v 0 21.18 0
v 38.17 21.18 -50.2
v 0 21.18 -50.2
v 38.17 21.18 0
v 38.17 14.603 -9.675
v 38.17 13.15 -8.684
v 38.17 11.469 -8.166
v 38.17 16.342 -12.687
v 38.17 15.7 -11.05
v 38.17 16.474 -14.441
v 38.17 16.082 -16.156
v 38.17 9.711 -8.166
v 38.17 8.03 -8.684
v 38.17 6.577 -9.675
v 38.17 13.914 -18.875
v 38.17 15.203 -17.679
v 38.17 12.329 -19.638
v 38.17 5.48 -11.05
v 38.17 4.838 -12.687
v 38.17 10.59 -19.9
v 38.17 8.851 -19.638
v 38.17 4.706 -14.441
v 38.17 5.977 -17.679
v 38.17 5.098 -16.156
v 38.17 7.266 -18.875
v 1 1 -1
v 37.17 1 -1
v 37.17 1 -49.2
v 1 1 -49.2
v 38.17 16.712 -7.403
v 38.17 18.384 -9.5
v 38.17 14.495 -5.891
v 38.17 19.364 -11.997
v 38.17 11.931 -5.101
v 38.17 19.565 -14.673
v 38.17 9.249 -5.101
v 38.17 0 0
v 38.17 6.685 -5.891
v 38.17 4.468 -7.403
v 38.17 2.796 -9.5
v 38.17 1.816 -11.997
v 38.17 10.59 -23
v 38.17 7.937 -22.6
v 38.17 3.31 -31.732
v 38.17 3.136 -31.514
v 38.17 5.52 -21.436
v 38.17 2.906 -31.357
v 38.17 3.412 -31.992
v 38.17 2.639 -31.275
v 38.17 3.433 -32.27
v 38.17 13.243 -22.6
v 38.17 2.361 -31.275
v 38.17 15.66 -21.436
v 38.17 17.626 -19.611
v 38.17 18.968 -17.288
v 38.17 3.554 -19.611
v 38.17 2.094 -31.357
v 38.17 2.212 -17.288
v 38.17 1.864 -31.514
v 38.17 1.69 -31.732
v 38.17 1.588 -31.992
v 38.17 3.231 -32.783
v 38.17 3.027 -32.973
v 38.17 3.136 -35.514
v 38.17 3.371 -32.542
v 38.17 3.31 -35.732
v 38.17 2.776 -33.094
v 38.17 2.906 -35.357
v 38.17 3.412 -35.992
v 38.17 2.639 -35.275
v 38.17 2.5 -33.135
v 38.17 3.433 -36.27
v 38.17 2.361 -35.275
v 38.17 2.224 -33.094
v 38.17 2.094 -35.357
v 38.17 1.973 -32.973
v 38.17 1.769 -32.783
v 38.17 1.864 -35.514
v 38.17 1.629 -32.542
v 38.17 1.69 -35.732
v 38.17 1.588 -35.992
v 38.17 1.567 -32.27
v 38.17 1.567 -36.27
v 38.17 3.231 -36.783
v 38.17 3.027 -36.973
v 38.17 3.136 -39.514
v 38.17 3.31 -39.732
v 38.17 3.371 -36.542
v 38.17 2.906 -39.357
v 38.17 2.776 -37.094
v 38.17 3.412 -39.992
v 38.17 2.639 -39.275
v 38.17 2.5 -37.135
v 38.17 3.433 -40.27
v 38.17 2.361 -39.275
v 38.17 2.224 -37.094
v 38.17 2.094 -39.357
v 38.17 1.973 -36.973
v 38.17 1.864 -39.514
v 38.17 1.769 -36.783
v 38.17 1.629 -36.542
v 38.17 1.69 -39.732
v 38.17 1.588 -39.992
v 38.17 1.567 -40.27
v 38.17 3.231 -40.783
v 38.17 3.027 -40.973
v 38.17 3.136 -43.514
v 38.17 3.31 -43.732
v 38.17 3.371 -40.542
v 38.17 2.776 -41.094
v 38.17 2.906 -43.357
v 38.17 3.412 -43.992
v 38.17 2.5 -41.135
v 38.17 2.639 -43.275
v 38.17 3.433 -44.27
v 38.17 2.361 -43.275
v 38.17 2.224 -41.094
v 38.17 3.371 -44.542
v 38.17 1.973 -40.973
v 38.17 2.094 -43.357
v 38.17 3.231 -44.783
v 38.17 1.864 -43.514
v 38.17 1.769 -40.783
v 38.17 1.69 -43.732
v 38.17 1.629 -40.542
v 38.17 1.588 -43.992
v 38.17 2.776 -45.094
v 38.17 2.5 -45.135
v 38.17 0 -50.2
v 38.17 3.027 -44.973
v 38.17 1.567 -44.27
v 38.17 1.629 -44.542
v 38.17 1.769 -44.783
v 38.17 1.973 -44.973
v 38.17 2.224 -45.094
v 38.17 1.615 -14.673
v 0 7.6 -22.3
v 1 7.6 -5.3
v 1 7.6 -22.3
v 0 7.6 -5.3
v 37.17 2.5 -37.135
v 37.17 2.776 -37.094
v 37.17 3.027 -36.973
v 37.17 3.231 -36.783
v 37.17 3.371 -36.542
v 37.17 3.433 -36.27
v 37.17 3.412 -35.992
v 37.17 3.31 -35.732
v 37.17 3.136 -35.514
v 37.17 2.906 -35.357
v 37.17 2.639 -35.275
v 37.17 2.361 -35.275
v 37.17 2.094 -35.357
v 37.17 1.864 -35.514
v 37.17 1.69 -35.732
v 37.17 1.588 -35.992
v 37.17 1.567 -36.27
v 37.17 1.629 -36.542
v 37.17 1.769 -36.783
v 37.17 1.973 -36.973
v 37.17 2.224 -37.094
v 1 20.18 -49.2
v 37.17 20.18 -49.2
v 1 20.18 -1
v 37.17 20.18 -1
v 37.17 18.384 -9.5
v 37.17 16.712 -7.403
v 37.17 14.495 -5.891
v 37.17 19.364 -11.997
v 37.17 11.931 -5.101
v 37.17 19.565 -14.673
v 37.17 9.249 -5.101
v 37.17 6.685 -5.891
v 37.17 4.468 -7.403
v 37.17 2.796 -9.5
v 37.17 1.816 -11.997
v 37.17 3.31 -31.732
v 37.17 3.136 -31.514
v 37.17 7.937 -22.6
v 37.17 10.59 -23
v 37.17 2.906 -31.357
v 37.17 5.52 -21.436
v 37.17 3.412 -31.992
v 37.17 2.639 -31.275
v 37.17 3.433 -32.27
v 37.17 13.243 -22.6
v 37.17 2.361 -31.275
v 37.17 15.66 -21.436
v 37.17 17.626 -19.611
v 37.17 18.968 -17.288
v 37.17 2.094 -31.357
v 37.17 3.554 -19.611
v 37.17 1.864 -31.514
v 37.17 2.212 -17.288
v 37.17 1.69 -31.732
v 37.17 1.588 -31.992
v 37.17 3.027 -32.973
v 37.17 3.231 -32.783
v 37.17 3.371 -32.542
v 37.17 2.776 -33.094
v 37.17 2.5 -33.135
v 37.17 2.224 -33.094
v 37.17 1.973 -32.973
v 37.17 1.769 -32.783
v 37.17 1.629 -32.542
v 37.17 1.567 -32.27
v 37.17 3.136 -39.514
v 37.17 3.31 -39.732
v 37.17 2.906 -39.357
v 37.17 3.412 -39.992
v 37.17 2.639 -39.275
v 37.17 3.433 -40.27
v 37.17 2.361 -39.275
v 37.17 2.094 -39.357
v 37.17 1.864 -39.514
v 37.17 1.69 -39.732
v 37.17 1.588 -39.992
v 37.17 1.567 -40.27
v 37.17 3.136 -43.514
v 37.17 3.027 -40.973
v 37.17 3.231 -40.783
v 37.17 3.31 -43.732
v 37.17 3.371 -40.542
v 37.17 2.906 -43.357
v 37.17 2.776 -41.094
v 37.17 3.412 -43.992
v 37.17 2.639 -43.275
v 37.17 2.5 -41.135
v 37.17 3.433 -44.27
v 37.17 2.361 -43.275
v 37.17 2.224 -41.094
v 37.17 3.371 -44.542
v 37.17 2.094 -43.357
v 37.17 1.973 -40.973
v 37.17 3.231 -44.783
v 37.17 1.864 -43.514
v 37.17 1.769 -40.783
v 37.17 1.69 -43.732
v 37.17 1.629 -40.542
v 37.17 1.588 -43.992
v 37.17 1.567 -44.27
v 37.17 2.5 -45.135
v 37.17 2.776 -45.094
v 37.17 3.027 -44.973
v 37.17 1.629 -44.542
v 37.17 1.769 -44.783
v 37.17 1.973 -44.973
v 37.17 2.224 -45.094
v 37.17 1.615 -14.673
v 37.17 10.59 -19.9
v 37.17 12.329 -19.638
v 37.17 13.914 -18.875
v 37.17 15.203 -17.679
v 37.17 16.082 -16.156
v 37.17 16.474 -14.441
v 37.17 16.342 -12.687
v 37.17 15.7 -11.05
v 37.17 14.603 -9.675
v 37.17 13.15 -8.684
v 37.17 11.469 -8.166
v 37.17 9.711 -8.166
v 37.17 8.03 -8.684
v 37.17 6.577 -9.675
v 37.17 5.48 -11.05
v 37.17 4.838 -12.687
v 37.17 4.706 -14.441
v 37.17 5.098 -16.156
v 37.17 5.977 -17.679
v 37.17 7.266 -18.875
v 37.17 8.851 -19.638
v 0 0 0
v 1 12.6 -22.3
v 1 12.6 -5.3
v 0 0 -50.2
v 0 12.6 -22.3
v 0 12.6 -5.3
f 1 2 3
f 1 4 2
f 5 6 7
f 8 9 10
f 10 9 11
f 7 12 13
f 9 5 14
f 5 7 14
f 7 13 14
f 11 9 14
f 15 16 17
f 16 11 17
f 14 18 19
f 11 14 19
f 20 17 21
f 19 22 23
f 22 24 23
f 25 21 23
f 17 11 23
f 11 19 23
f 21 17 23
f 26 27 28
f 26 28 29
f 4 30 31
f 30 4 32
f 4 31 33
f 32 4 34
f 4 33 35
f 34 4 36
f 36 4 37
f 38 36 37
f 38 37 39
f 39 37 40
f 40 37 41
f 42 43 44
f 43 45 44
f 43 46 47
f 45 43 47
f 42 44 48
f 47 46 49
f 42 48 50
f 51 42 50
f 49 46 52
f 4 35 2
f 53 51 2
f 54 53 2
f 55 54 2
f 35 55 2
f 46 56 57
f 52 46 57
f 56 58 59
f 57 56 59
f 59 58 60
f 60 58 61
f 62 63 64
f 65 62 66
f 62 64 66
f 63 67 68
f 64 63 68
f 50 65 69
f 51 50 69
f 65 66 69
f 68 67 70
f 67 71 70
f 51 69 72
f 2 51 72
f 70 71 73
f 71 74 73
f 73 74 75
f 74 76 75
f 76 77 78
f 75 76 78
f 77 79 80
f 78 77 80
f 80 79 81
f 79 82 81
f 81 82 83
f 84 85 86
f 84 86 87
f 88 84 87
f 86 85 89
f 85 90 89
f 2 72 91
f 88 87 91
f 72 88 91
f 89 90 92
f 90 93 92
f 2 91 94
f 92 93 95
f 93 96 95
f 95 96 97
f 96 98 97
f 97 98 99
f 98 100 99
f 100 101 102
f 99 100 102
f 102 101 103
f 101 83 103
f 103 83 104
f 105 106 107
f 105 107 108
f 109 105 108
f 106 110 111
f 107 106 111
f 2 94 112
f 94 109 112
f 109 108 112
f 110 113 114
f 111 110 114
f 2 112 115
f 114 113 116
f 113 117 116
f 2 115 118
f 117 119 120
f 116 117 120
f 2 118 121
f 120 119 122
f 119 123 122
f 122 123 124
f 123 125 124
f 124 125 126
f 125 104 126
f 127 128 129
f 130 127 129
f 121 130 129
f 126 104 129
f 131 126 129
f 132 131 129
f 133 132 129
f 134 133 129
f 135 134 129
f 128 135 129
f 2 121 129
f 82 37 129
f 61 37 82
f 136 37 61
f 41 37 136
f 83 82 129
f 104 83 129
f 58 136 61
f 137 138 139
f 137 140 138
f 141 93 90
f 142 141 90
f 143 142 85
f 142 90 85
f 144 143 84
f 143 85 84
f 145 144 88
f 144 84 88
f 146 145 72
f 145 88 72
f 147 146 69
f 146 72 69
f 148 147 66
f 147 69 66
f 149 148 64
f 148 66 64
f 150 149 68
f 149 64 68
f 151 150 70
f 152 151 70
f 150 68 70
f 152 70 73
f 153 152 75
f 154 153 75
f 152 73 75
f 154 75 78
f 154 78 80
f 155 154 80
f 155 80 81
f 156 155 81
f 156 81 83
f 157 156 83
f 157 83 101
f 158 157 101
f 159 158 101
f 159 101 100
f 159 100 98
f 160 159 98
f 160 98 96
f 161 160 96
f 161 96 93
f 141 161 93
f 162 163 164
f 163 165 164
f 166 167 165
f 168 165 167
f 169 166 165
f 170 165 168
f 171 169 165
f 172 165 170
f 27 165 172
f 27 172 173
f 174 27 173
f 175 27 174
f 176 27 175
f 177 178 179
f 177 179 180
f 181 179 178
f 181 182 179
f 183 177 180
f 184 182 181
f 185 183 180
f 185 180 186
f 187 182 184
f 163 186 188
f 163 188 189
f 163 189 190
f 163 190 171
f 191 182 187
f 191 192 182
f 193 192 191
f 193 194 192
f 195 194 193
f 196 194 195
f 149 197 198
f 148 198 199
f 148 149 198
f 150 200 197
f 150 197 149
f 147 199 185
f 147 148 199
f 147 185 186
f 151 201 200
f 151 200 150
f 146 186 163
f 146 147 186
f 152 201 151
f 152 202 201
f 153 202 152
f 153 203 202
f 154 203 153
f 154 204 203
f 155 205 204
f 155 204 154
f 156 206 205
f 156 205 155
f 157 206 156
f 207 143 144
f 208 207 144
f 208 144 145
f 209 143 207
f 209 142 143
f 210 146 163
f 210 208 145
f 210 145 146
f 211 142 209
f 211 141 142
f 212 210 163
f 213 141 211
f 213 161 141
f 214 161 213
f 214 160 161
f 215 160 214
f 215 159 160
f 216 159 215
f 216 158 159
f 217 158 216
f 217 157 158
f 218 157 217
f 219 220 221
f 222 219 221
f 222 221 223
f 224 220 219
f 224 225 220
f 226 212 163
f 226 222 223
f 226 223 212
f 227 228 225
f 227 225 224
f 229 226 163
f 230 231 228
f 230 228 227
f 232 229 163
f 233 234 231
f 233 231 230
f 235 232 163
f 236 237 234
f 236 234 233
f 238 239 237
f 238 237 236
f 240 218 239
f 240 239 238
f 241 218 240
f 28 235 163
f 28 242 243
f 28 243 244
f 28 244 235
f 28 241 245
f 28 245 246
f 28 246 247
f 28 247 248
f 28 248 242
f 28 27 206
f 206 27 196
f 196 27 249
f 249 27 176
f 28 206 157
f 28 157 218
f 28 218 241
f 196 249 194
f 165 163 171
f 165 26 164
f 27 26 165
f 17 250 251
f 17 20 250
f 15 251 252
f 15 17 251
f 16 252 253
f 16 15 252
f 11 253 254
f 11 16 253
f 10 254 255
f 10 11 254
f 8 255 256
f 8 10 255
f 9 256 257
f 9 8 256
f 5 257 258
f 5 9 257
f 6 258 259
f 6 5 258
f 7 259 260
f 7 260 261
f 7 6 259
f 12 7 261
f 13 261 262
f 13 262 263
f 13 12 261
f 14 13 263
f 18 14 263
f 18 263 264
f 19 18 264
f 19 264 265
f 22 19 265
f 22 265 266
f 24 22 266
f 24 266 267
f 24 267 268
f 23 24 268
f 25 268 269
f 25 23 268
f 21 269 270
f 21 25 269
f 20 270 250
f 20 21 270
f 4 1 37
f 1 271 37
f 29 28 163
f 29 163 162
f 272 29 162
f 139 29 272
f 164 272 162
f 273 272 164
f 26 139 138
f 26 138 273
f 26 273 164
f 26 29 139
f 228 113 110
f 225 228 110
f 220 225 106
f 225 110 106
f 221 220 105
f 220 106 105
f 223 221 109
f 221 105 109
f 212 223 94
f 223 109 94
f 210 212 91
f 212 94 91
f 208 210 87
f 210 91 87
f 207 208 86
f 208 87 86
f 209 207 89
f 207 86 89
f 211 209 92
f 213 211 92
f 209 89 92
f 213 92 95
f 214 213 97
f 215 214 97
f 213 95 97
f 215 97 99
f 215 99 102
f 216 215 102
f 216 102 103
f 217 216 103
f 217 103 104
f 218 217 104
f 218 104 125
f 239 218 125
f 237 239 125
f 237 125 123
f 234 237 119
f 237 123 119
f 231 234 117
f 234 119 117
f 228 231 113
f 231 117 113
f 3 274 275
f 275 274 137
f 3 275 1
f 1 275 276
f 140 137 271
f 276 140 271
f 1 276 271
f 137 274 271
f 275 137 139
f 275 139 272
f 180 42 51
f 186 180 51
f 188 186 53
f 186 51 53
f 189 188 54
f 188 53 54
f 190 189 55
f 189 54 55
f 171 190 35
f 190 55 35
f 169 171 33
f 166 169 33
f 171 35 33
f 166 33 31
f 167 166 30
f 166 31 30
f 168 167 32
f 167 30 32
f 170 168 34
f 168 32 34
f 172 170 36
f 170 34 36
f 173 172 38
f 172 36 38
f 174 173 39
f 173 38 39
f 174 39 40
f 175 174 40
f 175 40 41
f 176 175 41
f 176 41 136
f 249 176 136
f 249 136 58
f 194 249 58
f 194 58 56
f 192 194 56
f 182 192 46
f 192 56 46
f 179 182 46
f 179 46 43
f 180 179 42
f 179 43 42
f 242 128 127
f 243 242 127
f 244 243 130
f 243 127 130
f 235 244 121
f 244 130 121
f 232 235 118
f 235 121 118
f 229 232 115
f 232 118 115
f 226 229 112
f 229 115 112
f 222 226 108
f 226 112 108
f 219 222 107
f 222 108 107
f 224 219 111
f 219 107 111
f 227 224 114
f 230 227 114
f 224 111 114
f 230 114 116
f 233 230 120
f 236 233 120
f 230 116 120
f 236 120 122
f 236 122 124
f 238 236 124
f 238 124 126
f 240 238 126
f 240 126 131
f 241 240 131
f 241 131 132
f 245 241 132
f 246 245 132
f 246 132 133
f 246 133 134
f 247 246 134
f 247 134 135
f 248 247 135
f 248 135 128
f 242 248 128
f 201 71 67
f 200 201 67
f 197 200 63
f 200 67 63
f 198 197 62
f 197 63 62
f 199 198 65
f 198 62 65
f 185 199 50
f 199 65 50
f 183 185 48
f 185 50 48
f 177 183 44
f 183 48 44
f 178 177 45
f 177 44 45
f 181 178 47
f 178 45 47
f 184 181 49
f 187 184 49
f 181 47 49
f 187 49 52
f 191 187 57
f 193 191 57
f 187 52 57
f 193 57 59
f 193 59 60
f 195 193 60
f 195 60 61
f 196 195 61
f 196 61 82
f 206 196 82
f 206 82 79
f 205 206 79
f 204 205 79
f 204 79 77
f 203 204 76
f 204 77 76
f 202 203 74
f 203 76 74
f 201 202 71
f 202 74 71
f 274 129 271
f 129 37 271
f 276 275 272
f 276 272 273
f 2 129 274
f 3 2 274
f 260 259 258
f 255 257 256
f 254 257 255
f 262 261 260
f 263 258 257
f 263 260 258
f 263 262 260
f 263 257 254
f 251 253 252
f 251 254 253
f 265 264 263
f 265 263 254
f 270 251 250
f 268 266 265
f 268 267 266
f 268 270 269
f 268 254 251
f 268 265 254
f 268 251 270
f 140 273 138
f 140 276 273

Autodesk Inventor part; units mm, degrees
ref_plane "YZ Plane" through (0, 0, 0) normal (1, 0, 0) x (0, 1, 0)
ref_plane "XZ Plane" through (0, 0, 0) normal (0, 1, 0) x (-1, 0, 0)
ref_plane "XY Plane" through (0, 0, 0) normal (0, 0, 1) x (1, 0, 0)
sketch "Sketch1" plane through (0, 0, 0) normal (0, 1, 0) x (-1, 0, 0)
  line L0 (0, 0) -> (-38.17, 0)
  line L1 (-38.17, 0) -> (-38.17, -50.2)
  line L2 (-38.17, -50.2) -> (0, -50.2)
  line L3 (0, -50.2) -> (0, 0)
  dimension "d0" = 38.17
  dimension "d1" = 50.2
extrude "Extrusion1" add sketch "Sketch1" along normal blind 21.18
shell "Shell1" thickness 1 removed faces 0
sketch "Sketch2" plane through (38.17, 0, 0) normal (1, 0, 0) x (0, 0, -1)
  circle A0 centre (14, 10.59) radius 9
  line L0 (0, 0) -> (0, 21.18) projected
  circle A1 centre (14, 10.59) radius 5.9
  circle A2 centre (32.2, 2.5) radius 0.9353
  circle A3 centre (36.2, 2.5) radius 0.9353
  circle A4 centre (40.2, 2.5) radius 0.9353
  circle A5 centre (44.2, 2.5) radius 0.9353
  line L1 (50.2, 0) -> (50.2, 21.18) projected
  line L2 (0, 0) -> (50.2, 0) projected
  point P0 (0, 10.59)
  dimension "d4" = 18
  dimension "d5" = 14
  dimension "d6" = 11.8
  dimension "d9" = 6
  dimension "d10" = 2.5
  dimension "d11" = 4
  dimension "d12" = 4
  dimension "d13" = 4
extrude "Extrusion2" cut sketch "Sketch2" against normal blind 4
sketch "Sketch3" plane through (0, 0, -50.2) normal (-1, 0, 0) x (0, 0, 1)
  line L0 (27.9, 12.6) -> (44.9, 12.6)
  line L1 (44.9, 12.6) -> (44.9, 7.6)
  line L2 (44.9, 7.6) -> (27.9, 7.6)
  line L3 (27.9, 7.6) -> (27.9, 12.6)
  line L4 (0, 0) -> (50.2, 0) projected
  dimension "d15" = 5
  dimension "d16" = 17
  dimension "d17" = 7.6
  dimension "d18" = 5.3
extrude "Extrusion3" cut sketch "Sketch3" against normal blind 4
equation "\"d7\" = d13"
equation "\"d19\" = d13"
properties part number "pms5003"
